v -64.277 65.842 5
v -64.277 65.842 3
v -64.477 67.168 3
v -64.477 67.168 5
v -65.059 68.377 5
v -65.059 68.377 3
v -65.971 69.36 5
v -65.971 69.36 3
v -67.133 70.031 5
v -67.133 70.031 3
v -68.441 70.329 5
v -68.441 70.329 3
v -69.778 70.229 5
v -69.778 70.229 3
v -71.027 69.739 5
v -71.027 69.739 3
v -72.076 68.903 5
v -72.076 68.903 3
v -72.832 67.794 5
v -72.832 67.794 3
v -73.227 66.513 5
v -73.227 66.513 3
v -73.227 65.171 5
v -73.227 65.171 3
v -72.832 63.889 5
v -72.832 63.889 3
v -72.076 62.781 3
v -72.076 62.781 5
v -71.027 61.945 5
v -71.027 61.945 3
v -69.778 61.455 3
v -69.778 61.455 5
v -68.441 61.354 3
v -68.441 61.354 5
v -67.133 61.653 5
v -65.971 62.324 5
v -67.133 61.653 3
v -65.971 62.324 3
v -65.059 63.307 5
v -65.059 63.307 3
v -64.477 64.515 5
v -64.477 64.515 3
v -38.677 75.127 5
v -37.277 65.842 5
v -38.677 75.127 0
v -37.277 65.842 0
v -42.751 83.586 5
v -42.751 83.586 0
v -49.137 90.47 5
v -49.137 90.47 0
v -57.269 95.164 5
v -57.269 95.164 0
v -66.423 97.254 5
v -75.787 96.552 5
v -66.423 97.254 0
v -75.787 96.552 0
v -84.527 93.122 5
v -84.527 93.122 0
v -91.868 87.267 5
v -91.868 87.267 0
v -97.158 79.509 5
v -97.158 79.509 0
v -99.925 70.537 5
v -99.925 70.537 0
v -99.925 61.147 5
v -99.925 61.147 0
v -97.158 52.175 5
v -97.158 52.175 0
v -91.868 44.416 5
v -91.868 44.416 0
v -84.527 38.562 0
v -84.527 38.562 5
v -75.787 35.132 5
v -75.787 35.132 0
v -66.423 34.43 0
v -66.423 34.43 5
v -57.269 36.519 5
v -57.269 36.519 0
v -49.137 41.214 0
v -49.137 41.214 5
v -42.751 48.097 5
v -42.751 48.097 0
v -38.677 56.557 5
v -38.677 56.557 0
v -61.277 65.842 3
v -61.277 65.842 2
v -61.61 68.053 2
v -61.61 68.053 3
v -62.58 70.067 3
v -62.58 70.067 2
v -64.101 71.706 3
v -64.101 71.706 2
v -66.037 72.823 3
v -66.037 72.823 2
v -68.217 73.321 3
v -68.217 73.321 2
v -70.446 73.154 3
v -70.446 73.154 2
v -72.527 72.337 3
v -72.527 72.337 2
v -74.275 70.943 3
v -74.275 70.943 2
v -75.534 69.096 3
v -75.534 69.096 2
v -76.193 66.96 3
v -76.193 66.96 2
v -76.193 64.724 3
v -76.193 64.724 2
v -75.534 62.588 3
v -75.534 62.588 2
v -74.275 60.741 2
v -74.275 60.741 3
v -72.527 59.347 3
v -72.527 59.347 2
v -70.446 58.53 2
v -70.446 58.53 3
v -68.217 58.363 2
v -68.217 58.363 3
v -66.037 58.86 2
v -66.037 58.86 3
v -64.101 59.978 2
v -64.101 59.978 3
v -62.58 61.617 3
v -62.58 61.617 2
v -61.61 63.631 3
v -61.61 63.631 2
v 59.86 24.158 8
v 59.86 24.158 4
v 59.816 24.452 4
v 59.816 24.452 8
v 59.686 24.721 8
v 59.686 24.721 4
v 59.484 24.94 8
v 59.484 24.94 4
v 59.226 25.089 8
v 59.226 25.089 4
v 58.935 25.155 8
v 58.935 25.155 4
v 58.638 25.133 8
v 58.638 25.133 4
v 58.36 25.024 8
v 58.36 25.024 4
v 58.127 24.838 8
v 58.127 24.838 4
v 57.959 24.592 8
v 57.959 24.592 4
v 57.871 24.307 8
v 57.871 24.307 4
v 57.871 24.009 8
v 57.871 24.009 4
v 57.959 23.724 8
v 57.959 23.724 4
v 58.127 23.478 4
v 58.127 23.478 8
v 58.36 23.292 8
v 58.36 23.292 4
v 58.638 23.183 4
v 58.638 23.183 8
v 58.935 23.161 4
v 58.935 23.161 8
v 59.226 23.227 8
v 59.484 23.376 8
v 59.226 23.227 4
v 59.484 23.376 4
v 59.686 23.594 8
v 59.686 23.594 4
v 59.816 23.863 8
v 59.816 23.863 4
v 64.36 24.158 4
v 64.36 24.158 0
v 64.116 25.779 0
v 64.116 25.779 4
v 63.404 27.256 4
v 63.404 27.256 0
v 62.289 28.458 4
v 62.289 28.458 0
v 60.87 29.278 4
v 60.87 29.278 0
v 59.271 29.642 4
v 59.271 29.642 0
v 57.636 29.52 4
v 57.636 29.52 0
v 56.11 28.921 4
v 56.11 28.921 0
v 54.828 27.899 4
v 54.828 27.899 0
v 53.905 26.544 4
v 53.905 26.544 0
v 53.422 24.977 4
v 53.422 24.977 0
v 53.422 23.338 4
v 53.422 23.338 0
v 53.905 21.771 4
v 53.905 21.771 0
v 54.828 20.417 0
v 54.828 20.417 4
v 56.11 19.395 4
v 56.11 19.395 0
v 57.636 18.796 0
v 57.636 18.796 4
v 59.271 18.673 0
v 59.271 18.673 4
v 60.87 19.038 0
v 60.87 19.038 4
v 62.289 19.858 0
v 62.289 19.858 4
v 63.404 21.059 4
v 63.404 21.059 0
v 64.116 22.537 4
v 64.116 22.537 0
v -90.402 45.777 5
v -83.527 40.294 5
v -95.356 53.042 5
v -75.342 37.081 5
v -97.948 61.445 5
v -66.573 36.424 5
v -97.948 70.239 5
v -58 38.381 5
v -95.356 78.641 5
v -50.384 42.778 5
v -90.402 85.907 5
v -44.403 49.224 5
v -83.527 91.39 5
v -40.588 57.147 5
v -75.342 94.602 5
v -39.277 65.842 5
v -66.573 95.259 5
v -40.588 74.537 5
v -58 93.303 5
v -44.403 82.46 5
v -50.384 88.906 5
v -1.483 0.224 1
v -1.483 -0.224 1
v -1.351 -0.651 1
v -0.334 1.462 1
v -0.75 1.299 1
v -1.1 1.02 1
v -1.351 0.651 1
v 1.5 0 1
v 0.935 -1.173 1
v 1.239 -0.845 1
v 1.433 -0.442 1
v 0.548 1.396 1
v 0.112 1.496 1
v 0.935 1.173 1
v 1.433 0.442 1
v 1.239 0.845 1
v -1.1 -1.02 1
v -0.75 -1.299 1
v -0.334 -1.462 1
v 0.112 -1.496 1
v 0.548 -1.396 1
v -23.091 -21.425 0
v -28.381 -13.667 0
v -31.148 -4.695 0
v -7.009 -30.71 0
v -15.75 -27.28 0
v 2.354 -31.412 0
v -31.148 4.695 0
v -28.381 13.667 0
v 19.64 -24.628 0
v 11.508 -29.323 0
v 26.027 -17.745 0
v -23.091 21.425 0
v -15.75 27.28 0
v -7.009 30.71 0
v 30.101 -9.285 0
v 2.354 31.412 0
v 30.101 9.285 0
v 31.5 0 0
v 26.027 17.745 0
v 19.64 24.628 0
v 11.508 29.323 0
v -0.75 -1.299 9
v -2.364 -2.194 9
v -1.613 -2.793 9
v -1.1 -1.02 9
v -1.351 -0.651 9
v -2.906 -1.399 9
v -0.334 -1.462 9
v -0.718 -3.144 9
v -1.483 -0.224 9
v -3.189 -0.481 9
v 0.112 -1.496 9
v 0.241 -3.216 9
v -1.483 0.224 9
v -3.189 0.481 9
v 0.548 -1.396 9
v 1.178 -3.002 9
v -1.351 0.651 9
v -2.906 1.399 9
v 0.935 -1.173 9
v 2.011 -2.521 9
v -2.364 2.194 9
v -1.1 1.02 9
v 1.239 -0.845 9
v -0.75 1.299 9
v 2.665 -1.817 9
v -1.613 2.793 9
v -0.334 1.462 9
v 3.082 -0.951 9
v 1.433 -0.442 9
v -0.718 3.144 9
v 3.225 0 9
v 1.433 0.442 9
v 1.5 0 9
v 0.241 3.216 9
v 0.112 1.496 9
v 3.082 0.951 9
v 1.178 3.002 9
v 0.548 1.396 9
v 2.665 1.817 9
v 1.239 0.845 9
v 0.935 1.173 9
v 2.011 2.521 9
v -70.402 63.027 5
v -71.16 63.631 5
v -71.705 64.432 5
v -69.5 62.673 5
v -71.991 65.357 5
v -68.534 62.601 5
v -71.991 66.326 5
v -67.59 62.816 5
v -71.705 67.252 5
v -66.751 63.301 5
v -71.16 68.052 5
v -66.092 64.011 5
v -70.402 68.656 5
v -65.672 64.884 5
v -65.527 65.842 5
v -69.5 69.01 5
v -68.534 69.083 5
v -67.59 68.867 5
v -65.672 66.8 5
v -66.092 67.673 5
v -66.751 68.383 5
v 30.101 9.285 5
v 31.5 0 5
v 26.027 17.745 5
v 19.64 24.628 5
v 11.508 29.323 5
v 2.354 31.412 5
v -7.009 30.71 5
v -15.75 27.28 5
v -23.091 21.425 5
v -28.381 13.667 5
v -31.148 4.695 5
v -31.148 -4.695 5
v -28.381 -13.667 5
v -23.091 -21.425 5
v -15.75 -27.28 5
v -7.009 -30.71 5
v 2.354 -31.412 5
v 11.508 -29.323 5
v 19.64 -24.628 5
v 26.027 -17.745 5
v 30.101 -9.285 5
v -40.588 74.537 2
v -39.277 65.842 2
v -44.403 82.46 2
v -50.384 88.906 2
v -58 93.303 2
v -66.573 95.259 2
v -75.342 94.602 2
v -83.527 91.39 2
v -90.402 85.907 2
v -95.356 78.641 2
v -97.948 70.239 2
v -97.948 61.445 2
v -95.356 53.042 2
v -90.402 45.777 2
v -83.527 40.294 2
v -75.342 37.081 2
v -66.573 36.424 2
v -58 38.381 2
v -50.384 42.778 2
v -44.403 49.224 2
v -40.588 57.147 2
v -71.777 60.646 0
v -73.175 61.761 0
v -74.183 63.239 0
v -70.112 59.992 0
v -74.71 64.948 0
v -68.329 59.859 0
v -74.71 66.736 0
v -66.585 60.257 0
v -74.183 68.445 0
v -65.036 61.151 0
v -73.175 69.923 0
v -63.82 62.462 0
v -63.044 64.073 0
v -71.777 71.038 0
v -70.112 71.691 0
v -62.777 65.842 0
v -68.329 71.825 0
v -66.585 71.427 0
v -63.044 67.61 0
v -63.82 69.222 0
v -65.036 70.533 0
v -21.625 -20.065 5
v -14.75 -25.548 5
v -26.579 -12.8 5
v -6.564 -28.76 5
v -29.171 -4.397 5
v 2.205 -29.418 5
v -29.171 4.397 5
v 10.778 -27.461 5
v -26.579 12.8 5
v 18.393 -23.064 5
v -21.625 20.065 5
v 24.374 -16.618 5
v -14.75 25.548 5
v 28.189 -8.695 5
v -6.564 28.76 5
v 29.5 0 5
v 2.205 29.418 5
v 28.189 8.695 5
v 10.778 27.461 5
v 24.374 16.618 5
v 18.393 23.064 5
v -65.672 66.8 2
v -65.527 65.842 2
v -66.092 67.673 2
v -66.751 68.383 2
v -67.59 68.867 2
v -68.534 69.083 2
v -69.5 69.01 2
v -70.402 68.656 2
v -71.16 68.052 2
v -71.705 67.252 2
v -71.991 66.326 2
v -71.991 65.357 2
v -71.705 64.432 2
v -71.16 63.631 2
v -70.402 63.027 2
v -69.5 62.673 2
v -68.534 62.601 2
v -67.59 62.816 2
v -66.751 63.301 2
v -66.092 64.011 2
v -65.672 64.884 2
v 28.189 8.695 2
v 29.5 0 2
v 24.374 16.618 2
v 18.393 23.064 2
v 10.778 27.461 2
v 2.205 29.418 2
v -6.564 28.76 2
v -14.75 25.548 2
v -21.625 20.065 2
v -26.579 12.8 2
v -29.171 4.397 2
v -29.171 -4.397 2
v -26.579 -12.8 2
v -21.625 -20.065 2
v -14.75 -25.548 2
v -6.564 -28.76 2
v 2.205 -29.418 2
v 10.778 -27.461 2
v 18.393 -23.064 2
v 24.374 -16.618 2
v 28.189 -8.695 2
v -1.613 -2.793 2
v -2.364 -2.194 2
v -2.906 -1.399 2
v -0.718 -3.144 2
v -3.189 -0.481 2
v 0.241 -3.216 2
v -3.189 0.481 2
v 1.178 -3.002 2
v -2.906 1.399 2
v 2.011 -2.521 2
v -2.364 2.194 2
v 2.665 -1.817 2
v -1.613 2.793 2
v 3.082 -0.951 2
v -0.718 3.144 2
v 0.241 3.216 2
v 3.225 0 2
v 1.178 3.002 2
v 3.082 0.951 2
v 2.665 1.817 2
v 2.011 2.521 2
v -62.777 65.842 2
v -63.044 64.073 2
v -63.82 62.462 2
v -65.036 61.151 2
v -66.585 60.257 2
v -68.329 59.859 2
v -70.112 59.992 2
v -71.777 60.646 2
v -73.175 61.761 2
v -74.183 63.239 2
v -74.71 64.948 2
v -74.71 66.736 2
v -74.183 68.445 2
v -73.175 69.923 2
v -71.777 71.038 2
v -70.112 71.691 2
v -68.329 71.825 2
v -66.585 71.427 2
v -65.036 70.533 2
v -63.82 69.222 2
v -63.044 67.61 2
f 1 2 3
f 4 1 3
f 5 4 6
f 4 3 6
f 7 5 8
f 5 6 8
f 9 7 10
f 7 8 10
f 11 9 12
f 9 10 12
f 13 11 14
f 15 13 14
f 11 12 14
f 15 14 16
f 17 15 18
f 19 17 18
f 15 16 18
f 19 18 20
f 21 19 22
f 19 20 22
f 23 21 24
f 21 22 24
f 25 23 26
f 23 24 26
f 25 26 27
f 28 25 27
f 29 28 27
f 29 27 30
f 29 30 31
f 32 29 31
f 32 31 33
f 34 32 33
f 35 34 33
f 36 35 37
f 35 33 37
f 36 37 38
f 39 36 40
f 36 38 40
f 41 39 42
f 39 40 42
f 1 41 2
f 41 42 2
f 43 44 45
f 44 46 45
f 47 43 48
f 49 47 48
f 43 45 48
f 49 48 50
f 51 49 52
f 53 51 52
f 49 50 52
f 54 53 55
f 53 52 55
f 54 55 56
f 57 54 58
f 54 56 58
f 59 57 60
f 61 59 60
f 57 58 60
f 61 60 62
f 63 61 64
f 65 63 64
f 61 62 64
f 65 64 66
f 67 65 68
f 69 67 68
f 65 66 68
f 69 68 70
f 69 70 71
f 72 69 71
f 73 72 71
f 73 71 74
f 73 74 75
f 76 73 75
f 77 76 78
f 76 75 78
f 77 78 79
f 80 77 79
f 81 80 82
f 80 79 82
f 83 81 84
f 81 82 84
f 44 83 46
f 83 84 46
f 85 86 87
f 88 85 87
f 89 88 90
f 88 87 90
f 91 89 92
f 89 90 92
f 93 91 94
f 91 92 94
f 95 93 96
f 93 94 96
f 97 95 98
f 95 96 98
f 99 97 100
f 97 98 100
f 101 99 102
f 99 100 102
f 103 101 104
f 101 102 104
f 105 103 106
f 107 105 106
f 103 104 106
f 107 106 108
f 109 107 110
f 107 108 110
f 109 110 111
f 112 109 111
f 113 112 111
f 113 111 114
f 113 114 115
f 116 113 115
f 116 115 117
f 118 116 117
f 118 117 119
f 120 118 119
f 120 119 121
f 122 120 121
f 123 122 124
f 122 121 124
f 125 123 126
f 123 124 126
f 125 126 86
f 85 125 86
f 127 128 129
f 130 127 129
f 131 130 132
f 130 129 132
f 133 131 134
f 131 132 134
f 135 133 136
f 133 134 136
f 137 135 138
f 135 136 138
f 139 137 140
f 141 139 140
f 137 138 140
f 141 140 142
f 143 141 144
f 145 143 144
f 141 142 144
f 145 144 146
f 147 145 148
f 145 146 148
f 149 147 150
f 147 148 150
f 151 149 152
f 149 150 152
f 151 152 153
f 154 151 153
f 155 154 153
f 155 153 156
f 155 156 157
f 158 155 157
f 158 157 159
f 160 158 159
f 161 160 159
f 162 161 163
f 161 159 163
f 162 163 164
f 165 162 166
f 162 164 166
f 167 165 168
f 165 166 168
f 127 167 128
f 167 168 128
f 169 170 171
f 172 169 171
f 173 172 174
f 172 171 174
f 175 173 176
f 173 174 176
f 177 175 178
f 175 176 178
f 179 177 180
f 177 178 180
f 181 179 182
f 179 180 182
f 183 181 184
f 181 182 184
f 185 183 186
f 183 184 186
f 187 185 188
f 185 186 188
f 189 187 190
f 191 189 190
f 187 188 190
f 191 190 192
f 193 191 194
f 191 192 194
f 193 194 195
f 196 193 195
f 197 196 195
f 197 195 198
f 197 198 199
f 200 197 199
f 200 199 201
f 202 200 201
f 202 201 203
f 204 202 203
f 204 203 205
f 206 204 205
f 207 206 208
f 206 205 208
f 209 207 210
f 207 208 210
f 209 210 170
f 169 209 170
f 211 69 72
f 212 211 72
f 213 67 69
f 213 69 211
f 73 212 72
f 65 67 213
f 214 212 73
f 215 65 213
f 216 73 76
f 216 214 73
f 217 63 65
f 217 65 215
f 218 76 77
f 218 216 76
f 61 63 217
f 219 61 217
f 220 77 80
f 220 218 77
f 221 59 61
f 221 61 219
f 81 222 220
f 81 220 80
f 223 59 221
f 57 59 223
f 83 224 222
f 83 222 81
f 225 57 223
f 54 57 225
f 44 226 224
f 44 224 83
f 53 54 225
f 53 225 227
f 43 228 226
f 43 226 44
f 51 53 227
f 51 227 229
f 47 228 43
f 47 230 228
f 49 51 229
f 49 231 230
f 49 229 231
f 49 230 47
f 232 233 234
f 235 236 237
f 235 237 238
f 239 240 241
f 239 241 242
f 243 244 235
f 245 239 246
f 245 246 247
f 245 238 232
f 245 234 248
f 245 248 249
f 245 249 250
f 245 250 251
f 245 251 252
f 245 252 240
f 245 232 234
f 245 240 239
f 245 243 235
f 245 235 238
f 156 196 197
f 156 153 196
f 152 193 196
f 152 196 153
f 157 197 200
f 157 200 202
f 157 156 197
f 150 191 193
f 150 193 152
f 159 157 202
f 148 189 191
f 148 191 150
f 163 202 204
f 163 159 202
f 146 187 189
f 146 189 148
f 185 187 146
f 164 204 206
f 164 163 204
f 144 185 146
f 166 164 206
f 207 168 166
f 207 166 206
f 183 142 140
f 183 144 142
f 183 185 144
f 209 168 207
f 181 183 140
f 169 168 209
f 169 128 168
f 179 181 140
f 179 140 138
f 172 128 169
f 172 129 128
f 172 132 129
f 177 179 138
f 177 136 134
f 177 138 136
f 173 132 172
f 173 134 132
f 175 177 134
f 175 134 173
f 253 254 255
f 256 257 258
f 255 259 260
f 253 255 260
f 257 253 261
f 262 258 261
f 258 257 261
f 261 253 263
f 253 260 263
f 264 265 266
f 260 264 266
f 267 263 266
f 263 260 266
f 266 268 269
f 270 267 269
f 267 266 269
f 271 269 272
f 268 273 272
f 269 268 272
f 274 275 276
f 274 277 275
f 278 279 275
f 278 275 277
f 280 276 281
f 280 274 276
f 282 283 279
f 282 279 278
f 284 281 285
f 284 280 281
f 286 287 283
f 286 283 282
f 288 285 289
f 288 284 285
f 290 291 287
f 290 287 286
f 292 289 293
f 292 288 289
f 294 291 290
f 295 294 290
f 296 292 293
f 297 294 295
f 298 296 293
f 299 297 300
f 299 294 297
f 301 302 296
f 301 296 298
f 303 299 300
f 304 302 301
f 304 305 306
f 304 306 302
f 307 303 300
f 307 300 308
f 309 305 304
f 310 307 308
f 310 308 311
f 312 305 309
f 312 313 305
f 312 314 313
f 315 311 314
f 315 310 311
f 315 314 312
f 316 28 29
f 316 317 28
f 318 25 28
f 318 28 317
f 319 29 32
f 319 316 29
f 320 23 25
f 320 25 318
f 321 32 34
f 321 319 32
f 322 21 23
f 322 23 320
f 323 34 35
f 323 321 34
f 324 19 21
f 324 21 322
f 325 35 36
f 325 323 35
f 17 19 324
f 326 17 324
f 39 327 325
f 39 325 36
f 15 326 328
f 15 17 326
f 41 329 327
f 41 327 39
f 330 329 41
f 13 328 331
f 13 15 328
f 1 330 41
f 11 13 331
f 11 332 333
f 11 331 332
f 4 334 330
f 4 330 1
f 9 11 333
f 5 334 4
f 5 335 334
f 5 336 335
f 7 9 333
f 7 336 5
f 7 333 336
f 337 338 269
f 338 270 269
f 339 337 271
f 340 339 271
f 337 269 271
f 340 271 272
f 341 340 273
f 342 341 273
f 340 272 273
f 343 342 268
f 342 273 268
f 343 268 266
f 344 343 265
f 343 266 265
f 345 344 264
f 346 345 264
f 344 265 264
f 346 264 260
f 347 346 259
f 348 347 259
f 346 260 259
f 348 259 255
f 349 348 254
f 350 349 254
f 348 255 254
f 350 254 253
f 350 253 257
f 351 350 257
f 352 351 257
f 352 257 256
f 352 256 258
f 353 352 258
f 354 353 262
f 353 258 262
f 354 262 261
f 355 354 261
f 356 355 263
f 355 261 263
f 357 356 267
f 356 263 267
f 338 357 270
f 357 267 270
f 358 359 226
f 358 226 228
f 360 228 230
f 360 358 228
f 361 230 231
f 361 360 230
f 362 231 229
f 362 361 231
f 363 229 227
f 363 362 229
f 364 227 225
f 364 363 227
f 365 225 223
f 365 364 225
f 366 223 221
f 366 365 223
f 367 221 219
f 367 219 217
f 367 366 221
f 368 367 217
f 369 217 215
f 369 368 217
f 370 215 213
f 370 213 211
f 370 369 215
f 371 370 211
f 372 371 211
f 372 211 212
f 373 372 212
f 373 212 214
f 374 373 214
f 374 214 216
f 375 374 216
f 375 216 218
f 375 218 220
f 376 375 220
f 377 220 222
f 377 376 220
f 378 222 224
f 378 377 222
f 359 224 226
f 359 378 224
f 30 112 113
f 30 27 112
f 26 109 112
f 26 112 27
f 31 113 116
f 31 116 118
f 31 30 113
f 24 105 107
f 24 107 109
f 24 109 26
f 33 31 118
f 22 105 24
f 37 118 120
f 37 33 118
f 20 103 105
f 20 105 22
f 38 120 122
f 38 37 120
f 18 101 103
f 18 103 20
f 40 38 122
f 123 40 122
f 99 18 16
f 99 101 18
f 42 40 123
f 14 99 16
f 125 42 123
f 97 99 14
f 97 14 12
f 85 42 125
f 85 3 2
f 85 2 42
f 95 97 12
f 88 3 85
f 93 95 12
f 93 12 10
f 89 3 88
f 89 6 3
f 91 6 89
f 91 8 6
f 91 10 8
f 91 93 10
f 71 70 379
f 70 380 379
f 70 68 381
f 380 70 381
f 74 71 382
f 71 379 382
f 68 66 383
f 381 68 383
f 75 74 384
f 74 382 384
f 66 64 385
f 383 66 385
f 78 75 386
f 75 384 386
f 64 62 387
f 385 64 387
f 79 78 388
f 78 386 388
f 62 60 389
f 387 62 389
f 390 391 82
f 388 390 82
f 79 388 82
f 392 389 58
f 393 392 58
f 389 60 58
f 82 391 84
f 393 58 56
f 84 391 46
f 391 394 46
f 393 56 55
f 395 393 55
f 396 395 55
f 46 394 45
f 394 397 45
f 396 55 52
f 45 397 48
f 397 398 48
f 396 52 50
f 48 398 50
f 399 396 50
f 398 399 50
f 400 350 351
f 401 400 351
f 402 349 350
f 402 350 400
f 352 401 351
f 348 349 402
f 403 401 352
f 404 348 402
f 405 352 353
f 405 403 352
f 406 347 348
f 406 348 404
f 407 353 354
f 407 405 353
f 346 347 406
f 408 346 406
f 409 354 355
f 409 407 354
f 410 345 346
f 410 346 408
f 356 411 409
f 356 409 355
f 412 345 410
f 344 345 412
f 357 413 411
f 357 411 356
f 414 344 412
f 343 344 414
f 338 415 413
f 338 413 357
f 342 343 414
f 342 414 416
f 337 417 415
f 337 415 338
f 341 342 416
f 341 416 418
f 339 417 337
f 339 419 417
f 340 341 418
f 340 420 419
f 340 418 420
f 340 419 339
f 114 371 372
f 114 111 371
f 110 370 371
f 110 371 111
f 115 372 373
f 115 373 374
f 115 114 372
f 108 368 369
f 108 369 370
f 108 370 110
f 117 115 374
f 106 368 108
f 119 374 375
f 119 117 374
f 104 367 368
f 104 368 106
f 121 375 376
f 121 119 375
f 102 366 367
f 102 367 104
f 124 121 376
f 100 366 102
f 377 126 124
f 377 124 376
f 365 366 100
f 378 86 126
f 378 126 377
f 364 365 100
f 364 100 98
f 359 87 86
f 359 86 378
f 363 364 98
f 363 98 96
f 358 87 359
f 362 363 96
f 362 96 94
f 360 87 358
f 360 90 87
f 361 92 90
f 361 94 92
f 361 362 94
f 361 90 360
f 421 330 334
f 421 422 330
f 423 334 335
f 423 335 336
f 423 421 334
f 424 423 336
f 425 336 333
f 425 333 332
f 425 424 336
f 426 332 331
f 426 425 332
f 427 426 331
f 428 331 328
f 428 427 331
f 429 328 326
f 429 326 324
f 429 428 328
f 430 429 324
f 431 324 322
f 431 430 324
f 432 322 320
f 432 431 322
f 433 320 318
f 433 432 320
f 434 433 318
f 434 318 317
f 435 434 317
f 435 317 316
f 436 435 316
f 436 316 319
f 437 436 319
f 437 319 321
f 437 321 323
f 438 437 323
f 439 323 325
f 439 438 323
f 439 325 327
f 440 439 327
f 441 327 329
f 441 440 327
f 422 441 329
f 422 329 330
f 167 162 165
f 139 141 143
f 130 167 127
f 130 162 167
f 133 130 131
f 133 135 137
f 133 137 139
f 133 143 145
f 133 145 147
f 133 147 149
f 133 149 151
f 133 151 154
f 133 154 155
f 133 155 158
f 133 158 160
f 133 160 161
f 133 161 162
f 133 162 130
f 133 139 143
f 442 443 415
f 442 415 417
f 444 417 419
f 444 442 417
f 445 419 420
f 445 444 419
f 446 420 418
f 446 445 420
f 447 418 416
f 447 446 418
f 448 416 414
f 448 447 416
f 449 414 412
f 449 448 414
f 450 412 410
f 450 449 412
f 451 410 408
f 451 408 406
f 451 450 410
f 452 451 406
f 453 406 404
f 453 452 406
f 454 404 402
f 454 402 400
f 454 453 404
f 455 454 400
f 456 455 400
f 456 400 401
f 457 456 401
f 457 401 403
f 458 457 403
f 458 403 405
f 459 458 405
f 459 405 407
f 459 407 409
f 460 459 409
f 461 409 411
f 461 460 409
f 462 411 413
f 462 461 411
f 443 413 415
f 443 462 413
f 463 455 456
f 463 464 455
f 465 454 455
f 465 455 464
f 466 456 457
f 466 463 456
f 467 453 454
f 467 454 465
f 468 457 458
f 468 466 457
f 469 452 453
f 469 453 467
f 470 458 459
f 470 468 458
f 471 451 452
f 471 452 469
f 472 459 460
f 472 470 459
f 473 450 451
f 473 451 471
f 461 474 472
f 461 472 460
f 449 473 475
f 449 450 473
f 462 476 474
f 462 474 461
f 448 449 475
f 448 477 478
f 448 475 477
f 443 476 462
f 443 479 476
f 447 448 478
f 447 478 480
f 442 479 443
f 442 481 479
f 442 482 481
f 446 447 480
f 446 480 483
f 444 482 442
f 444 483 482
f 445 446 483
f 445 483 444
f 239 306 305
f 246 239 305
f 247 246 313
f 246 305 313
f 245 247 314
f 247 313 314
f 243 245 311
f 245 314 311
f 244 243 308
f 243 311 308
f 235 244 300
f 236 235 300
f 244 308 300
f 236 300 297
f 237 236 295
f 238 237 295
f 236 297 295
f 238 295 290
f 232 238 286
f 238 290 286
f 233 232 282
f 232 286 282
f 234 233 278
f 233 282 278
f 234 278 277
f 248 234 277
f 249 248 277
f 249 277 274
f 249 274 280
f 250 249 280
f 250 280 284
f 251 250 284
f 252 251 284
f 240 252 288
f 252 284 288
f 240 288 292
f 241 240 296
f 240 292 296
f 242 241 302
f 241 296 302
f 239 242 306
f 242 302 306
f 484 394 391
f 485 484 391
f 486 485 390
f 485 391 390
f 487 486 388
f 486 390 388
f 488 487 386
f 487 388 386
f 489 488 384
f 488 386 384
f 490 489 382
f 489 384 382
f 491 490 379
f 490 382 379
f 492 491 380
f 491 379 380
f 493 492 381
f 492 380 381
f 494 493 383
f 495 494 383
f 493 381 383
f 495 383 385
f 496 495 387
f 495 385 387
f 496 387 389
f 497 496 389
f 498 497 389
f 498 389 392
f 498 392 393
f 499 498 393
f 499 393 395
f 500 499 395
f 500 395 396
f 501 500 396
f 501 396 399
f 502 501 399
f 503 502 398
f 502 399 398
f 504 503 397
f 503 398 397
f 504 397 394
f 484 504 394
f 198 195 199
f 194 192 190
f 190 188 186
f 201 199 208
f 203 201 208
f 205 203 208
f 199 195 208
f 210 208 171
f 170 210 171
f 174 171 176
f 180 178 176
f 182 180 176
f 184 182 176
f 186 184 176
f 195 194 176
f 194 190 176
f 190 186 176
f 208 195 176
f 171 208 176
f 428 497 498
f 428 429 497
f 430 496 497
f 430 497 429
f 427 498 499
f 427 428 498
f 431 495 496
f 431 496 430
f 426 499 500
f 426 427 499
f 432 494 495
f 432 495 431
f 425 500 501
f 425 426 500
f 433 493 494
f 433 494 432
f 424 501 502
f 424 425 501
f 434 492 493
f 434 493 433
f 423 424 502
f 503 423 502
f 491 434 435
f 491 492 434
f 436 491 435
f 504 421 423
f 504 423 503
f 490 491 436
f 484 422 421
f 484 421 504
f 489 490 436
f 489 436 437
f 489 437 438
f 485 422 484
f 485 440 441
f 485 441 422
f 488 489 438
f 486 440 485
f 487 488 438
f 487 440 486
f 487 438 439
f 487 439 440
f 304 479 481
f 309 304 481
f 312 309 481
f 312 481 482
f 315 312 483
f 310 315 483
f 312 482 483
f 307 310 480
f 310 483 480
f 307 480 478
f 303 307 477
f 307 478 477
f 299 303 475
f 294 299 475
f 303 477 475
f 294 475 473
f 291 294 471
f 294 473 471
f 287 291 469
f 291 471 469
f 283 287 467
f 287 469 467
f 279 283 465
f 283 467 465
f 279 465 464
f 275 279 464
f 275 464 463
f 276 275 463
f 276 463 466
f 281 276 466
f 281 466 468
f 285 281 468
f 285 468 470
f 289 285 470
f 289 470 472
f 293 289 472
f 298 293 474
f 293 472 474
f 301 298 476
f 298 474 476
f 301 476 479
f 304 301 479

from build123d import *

# Parameters (mm, degrees)
F0_R      = 31.5
F1_DEPTH  = 2
F2_R      = 3.225
F3_DEPTH  = 7
F4_R      = 31.5
F4_R_2    = 29.5
F5_DEPTH  = 3
F6_R      = 1.5
F7_DEPTH  = 8
F8_R      = 31.5
F9_DEPTH  = 2
F10_R     = 31.5
F10_R_2   = 29.5
F11_DEPTH = 3
F12_R     = 3.25
F13_DEPTH = 25
F14_R     = 7.5
F14_R_2   = 3.25
F15_DEPTH = 1
F16_R     = 4.5
F16_R_2   = 3.25
F17_DEPTH = 2
F18_R     = 6
F18_R_2   = 3.25
F19_DEPTH = 2
F20_R     = 5.5
F21_DEPTH = 4
F22_R     = 1
F23_DEPTH = 4


with BuildPart() as f1:
    # F0 (on Top) → F1 (new body)
    with BuildSketch(Plane.XY):
        Circle(F0_R)
    extrude(amount=F1_DEPTH)

    # F2 (on face) → F3 (join)
    with BuildSketch(Plane.XY.offset(2)):
        Circle(F2_R)
    extrude(amount=F3_DEPTH)

    # F4 (on face) → F5 (join)
    with BuildSketch(Plane.XY.offset(2)):
        Circle(F4_R)
        Circle(F4_R_2, mode=Mode.SUBTRACT)
    extrude(amount=F5_DEPTH)

    # F6 (on face) → F7 (cut)
    with BuildSketch(Plane.XY.offset(9)):
        Circle(F6_R)
    extrude(amount=-F7_DEPTH, mode=Mode.SUBTRACT)


with BuildPart() as f9:
    # F8 (on Top) → F9 (new body)
    with BuildSketch(Plane.XY):
        with Locations((-68.7771439552, 65.8418387175)):
            Circle(F8_R)
    extrude(amount=F9_DEPTH)

    # F10 (on face) → F11 (join)
    with BuildSketch(Plane.XY.offset(2)):
        with Locations((-68.7771439552, 65.8418387175)):
            Circle(F10_R)
        with Locations((-68.7771439552, 65.8418387175)):
            Circle(F10_R_2, mode=Mode.SUBTRACT)
    extrude(amount=F11_DEPTH)

    # F12 (on face) → F13 (cut)
    with BuildSketch(Plane.XY.offset(2)):
        with Locations((-68.7771439552, 65.8418387175)):
            Circle(F12_R)
    extrude(amount=-F13_DEPTH, mode=Mode.SUBTRACT)

    # F14 (on face) → F15 (join)
    with BuildSketch(Plane.XY.offset(2)):
        with Locations((-68.7771439552, 65.8418387175)):
            Circle(F14_R)
        with Locations((-68.7771439552, 65.8418387175)):
            Circle(F14_R_2, mode=Mode.SUBTRACT)
    extrude(amount=F15_DEPTH)

    # F16 (on face) → F17 (join)
    with BuildSketch(Plane.XY.offset(3)):
        with Locations((-68.7771439552, 65.8418387175)):
            Circle(F16_R)
        with Locations((-68.7771439552, 65.8418387175)):
            Circle(F16_R_2, mode=Mode.SUBTRACT)
    extrude(amount=F17_DEPTH)

    # F18 (on face) → F19 (cut)
    with BuildSketch(Plane(origin=(0, 0, 0), x_dir=(1, 0, 0), z_dir=(0, 0, -1))):
        with Locations((-68.7771439552, -65.8418387175)):
            Circle(F18_R)
        with Locations((-68.7771439552, -65.8418387175)):
            Circle(F18_R_2, mode=Mode.SUBTRACT)
    extrude(amount=-F19_DEPTH, mode=Mode.SUBTRACT)


with BuildPart() as f21:
    # F20 (on Top) → F21 (new body)
    with BuildSketch(Plane.XY):
        with Locations((58.8601864874, 24.157717824)):
            Circle(F20_R)
    extrude(amount=F21_DEPTH)

    # F22 (on face) → F23 (join)
    with BuildSketch(Plane.XY.offset(4)):
        with Locations((58.8601864874, 24.157717824)):
            Circle(F22_R)
    extrude(amount=F23_DEPTH)


solid = Compound([f1.part, f9.part, f21.part])
